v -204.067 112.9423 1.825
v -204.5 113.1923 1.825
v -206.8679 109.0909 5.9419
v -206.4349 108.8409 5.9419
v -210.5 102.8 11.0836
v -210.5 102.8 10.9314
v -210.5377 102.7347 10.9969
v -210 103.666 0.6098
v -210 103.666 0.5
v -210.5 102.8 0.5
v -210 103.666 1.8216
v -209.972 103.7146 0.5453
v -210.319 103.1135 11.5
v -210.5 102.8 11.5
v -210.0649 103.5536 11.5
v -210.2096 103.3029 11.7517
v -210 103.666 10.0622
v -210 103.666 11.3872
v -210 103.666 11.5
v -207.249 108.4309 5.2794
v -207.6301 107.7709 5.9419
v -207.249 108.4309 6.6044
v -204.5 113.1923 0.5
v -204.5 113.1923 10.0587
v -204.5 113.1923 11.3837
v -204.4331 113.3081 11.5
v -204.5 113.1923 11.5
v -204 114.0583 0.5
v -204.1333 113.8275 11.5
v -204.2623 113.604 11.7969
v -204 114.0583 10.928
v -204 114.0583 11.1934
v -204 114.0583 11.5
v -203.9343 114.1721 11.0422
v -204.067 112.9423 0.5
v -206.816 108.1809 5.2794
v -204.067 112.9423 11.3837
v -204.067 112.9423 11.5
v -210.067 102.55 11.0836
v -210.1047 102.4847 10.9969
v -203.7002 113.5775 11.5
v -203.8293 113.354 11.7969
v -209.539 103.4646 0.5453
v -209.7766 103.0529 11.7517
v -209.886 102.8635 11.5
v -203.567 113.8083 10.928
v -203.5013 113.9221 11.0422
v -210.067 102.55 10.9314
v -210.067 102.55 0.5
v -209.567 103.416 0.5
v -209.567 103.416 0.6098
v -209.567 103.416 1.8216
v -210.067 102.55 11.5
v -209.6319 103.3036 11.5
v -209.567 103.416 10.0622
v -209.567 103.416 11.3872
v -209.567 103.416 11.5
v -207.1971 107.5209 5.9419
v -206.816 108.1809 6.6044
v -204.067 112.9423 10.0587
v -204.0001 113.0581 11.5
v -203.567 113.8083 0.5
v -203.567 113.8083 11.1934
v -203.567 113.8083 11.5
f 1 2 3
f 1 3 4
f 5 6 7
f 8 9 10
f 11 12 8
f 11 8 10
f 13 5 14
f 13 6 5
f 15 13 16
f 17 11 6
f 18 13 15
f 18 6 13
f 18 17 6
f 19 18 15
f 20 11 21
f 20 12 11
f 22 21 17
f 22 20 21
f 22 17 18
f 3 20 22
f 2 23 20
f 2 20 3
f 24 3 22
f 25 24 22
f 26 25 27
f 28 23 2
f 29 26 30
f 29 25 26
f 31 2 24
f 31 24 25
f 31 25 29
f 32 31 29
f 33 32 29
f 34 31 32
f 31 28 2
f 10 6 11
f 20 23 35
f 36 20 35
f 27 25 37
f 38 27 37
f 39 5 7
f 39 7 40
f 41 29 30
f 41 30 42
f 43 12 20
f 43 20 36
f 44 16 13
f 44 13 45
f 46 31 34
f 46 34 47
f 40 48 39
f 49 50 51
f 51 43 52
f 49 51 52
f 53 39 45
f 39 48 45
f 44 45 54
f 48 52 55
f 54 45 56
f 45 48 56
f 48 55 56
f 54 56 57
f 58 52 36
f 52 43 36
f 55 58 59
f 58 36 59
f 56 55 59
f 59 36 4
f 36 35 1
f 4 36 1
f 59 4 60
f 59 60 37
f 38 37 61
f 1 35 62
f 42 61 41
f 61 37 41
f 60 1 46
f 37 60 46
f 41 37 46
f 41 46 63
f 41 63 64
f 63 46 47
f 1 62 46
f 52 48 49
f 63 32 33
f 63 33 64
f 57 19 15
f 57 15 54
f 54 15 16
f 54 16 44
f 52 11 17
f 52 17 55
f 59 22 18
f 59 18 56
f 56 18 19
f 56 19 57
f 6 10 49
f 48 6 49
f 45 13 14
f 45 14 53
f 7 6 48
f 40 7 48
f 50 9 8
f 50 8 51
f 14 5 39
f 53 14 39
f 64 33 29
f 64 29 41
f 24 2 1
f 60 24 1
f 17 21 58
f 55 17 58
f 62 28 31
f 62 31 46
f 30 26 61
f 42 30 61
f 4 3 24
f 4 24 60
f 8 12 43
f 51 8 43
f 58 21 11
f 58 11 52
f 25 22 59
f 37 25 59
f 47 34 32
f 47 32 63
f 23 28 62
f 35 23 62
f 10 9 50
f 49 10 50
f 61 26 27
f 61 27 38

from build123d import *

# Parameters (mm, degrees)
BOX220_W                  = 0.5
BOX220_H                  = 1
BOX220_DEPTH              = 11
BOX221_W                  = 0.5
BOX221_H                  = 1
BOX221_DEPTH              = 16
BOX221_ROLL_ANGLE         = 49
BOX222_W                  = 0.5
BOX222_H                  = 1
BOX222_DEPTH              = 16
BOX222_ROLL_ANGLE         = -49
BOX219_W                  = 0.5
BOX219_H                  = 1
BOX219_DEPTH              = 11
FUSION017_PLACEMENT_ANGLE = 30


with BuildPart() as cubo220:
    # Box220 → Box220 (new body)
    with BuildSketch(Plane(origin=(0, 12, 0.5), x_dir=(1, 0, 0), z_dir=(0, 0, 1))):
        with Locations((0.25, 0.5)):
            Rectangle(BOX220_W, BOX220_H)
    extrude(amount=BOX220_DEPTH)


with BuildPart() as cubo221:
    # Box221 → Box221 (new body)
    with BuildSketch(Plane.XY):
        with Locations((0.25, 0.5)):
            Rectangle(BOX221_W, BOX221_H)
    extrude(amount=BOX221_DEPTH)


with BuildPart() as cubo221_1:
    # Box221 roll: moved
    add(cubo221.part.rotate(Axis((0, 0, 0), (1, 0, 0)), BOX221_ROLL_ANGLE))


with BuildPart() as cubo221_2:
    # Box221 placement: moved
    add(cubo221_1.part.moved(Location((0, 12, 0.5))))


with BuildPart() as cubo222:
    # Box222 → Box222 (new body)
    with BuildSketch(Plane.XY):
        with Locations((0.25, 0.5)):
            Rectangle(BOX222_W, BOX222_H)
    extrude(amount=BOX222_DEPTH)


with BuildPart() as cubo222_1:
    # Box222 roll: moved
    add(cubo222.part.rotate(Axis((0, 0, 0), (1, 0, 0)), BOX222_ROLL_ANGLE))


with BuildPart() as cubo222_2:
    # Box222 placement: moved
    add(cubo222_1.part.moved(Location((0, 0.4, 1.3))))


with BuildPart() as fusion017:
    # Box219 → Box219 (new body)
    with BuildSketch(Plane.XY.offset(0.5)):
        with Locations((0.25, 0.5)):
            Rectangle(BOX219_W, BOX219_H)
    extrude(amount=BOX219_DEPTH)

    # Fusion017: union Cubo220, Cubo221, Cubo222
    add(cubo220.part)
    add(cubo221_2.part)
    add(cubo222_2.part)


with BuildPart() as fusion017_1:
    # Fusion017 placement: moved
    add(fusion017.part.moved(Location((-210.5, 102.8, 0))).rotate(Axis((-210.5, 102.8, 0), (0, 0, -1)), FUSION017_PLACEMENT_ANGLE))


solid = fusion017_1.part
